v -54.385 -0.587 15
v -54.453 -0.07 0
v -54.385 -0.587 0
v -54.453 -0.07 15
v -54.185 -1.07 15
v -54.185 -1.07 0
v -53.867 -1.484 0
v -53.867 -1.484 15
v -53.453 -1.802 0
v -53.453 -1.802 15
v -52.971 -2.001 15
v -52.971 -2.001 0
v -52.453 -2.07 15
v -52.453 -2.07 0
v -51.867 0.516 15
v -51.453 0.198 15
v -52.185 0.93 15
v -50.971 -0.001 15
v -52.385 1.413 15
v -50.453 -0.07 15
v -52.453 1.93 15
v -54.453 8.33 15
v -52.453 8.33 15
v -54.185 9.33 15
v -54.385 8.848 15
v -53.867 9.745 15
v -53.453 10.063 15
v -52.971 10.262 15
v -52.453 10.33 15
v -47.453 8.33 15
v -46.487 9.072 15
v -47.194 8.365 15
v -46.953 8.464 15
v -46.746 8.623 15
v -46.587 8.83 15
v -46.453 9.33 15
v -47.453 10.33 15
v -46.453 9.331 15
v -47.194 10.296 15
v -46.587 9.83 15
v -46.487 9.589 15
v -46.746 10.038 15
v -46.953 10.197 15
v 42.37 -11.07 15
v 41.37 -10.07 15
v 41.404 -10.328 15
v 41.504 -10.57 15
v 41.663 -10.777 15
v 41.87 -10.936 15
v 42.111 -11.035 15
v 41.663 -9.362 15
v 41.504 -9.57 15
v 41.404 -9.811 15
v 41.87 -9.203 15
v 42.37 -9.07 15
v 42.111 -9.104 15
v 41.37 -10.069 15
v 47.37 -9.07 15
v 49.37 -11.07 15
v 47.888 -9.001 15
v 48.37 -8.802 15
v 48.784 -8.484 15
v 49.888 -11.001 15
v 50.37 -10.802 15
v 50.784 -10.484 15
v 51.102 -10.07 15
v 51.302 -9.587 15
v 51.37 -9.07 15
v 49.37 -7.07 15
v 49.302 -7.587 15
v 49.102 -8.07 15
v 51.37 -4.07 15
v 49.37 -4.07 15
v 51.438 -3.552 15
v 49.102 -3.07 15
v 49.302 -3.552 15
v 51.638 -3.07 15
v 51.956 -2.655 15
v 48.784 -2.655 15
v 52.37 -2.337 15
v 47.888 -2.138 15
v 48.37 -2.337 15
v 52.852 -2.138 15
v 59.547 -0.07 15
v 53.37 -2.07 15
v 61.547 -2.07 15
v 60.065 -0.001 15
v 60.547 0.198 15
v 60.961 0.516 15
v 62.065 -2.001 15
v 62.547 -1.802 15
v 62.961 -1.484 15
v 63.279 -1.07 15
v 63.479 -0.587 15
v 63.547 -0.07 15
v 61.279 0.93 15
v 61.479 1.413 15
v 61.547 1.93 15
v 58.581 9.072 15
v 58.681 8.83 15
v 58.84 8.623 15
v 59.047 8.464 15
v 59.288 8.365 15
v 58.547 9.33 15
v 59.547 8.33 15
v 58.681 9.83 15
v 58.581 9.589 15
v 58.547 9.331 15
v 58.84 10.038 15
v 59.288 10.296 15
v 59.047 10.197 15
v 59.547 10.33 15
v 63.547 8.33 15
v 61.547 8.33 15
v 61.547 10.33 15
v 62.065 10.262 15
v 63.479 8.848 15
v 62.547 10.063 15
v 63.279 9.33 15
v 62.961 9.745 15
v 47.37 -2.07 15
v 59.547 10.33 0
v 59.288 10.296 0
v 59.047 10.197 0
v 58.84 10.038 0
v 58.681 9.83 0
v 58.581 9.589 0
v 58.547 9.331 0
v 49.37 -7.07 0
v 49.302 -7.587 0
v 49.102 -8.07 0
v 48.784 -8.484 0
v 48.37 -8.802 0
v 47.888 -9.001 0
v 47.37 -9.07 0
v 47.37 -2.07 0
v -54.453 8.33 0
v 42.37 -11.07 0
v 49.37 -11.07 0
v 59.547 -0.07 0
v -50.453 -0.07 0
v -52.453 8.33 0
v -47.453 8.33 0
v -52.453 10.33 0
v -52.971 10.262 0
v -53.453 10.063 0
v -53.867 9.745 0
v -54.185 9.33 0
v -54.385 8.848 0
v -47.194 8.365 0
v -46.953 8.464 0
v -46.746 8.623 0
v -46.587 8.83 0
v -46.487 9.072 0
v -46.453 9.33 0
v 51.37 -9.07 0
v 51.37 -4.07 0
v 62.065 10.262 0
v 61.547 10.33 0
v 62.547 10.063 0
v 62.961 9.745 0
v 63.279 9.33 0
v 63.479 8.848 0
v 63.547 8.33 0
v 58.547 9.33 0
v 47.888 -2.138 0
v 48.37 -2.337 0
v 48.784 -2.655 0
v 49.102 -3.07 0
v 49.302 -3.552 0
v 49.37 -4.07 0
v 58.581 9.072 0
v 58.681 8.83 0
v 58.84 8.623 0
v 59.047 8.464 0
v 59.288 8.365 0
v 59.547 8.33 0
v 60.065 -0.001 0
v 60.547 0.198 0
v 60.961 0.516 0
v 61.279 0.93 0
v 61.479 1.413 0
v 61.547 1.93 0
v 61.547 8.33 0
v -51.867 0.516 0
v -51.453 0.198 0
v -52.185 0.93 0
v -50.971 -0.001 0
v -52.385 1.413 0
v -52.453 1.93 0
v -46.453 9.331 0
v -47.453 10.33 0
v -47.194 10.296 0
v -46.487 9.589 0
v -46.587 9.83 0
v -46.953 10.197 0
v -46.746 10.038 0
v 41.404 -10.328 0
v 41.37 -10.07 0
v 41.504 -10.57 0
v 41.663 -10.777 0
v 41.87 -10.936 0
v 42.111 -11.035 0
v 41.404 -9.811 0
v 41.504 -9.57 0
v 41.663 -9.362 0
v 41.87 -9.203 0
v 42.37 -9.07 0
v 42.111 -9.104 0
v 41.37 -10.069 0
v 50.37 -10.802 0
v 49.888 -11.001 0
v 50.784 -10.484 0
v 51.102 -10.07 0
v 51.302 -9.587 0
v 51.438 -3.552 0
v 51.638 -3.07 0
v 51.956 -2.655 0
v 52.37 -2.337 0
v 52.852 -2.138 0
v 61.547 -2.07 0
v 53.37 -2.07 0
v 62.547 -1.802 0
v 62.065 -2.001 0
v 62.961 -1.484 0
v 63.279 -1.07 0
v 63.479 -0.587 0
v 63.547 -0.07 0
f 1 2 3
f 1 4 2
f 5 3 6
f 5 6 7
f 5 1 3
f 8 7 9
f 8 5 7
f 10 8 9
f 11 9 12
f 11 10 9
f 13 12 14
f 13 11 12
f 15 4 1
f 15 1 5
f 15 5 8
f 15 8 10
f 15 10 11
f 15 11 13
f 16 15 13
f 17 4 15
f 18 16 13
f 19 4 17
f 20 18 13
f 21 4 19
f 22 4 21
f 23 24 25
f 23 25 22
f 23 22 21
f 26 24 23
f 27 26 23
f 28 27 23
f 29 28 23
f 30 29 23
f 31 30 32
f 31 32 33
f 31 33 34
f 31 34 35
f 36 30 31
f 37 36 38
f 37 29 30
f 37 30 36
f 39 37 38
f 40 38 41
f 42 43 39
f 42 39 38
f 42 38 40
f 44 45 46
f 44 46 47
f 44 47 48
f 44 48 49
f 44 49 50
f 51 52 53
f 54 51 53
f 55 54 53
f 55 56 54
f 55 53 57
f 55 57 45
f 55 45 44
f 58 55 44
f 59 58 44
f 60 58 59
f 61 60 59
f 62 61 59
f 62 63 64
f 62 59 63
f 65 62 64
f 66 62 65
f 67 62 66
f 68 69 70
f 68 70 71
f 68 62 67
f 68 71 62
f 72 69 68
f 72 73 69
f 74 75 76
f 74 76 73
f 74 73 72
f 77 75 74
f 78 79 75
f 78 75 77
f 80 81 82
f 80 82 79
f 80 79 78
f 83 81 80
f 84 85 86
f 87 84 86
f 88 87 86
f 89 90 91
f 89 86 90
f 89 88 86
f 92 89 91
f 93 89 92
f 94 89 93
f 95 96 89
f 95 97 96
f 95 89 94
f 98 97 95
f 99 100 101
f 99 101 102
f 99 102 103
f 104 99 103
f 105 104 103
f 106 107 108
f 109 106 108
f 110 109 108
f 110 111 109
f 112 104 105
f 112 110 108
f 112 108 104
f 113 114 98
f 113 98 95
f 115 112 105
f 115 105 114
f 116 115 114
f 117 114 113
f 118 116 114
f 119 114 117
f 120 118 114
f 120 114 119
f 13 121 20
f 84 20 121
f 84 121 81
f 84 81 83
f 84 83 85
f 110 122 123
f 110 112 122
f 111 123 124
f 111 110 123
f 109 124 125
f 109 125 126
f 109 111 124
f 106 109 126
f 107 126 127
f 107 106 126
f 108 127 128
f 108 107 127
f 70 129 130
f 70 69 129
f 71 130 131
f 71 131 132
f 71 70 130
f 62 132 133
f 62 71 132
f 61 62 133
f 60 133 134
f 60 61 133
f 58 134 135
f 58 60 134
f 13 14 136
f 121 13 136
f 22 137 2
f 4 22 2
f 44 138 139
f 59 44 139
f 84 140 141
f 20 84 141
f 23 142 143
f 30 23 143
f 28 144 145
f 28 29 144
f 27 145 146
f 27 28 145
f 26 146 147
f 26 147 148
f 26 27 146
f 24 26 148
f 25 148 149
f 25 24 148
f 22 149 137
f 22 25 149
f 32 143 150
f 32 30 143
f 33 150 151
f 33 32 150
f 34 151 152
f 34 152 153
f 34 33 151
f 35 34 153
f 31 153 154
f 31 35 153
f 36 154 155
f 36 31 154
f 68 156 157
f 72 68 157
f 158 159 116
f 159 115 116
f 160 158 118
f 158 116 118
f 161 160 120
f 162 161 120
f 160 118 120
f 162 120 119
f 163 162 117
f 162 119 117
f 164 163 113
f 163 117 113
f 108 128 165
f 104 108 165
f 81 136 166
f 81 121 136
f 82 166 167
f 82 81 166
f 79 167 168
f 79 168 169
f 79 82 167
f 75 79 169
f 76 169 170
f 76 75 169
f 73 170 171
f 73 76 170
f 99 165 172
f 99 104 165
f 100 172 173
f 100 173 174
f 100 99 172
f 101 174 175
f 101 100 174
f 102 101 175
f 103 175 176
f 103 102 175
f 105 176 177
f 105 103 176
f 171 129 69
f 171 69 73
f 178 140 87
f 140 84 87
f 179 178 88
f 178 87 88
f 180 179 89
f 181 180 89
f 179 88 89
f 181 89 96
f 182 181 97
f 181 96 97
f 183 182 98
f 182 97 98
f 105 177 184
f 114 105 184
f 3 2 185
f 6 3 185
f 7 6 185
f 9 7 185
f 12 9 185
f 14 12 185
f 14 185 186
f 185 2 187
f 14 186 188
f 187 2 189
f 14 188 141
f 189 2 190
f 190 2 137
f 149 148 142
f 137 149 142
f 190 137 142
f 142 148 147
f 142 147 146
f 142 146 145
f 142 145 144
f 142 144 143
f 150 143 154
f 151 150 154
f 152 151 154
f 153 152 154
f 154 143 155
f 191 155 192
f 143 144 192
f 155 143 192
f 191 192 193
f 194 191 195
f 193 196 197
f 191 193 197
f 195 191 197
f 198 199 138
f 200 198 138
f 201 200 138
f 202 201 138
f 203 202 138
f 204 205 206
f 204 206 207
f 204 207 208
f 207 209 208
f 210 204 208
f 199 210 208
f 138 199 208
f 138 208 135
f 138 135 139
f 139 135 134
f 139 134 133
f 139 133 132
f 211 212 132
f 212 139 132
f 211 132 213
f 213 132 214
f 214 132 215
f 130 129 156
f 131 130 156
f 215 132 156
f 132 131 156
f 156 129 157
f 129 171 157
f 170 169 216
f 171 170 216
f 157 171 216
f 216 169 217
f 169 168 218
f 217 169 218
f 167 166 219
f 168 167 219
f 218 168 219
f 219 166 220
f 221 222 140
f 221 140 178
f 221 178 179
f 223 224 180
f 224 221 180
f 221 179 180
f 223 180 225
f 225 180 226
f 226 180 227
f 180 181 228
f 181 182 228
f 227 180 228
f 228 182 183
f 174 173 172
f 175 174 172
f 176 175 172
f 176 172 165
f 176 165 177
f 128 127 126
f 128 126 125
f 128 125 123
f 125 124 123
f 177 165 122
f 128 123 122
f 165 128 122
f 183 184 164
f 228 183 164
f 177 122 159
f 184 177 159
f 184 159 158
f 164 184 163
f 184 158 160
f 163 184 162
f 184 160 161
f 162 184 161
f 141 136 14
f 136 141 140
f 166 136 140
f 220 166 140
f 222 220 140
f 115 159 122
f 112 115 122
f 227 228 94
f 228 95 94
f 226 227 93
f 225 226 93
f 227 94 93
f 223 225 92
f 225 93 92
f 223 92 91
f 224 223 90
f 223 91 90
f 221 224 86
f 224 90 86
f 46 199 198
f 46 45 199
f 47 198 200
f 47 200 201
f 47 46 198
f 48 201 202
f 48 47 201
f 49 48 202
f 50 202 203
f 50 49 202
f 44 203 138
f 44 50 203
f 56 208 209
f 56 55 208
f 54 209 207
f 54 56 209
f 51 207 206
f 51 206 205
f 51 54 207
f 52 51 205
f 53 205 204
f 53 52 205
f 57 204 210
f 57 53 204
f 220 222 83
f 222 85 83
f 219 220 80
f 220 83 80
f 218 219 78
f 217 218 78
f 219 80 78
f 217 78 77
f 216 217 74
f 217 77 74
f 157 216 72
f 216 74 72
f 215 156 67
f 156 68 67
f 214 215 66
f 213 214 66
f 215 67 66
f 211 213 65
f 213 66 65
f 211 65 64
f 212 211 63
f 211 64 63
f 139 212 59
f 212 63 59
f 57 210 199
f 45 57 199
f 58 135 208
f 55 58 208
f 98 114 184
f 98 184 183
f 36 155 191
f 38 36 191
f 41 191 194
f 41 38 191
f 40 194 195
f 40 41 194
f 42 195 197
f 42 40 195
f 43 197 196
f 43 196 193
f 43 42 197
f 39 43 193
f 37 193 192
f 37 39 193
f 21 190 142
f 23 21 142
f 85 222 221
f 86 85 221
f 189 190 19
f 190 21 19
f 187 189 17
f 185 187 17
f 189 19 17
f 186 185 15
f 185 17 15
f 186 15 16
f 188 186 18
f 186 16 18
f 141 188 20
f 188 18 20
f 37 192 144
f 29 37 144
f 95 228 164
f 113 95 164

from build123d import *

# Parameters (mm, degrees)
F0_W     = 2
F0_H     = 7
F1_DEPTH = 15
F2_R     = 0.99999
F3_R     = 2


# Not quite as in the source:
# - a fillet or chamfer is up to 0.001 mm smaller than in the source, because OpenCascade refuses the exact size


with BuildPart() as f1:
    # F0 (on Top) → F1 (new body)
    with BuildSketch(Plane.XY):
        Polygon((61.5470979531, -0.0695097194), (-52.4529020469, -0.0695097194), (-52.4529020469, -2.0695097194), (49.3698753417, -2.0695097194), (51.3698753417, -2.0695097194), (61.5470979531, -2.0695097194), align=None)
        Polygon((-52.4529020469, -2.0695097194), (-52.4529020469, -0.0695097194), (-52.4529020469, 8.3304902806), (-54.4529020469, 8.3304902806), (-54.4529020469, -2.0695097194), align=None)
        Polygon((61.5470979531, 8.3304902806), (61.5470979531, -0.0695097194), (61.5470979531, -2.0695097194), (63.5470979531, -2.0695097194), (63.5470979531, 8.3304902806), align=None)
        Polygon((-54.4529020469, 8.3304902806), (-52.4529020469, 8.3304902806), (-46.4529020469, 8.3304902806), (-46.4529020469, 10.3304902806), (-54.4529020469, 10.3304902806), align=None)
        Polygon((58.5470979531, 8.3304902806), (61.5470979531, 8.3304902806), (63.5470979531, 8.3304902806), (63.5470979531, 10.3304902806), (58.5470979531, 10.3304902806), align=None)
        with Locations((50.3698753417, -5.5695097194)):
            Rectangle(F0_W, F0_H)
        Polygon((51.3698753417, -9.0695097194), (49.3698753417, -9.0695097194), (41.3698753417, -9.0695097194), (41.3698753417, -11.0695097194), (51.3698753417, -11.0695097194), align=None)
    extrude(amount=F1_DEPTH)

    # F2 (radius 1 in the source; OpenCascade refuses exactly that, so slightly less here)
    f2_edges = [f1.edges().sort_by_distance(p)[0] for p in [
        (58.547098, 10.33049, 7.5),
        (58.547098, 8.33049, 7.5),
        (-46.452902, 8.33049, 7.5),
        (-46.452902, 10.33049, 7.5),
        (41.369875, -9.06951, 7.5),
        (41.369875, -11.06951, 7.5),
    ]]
    fillet(f2_edges, radius=F2_R)

    # F3
    f3_edges = [f1.edges().sort_by_distance(p)[0] for p in [
        (-54.452902, 10.33049, 7.5),
        (-54.452902, -2.06951, 7.5),
        (63.547098, -2.06951, 7.5),
        (63.547098, 10.33049, 7.5),
        (51.369875, -11.06951, 7.5),
        (49.369875, -2.06951, 7.5),
        (51.369875, -2.06951, 7.5),
        (49.369875, -9.06951, 7.5),
        (-52.452902, -0.06951, 7.5),
        (61.547098, -0.06951, 7.5),
    ]]
    fillet(f3_edges, radius=F3_R)


solid = f1.part
